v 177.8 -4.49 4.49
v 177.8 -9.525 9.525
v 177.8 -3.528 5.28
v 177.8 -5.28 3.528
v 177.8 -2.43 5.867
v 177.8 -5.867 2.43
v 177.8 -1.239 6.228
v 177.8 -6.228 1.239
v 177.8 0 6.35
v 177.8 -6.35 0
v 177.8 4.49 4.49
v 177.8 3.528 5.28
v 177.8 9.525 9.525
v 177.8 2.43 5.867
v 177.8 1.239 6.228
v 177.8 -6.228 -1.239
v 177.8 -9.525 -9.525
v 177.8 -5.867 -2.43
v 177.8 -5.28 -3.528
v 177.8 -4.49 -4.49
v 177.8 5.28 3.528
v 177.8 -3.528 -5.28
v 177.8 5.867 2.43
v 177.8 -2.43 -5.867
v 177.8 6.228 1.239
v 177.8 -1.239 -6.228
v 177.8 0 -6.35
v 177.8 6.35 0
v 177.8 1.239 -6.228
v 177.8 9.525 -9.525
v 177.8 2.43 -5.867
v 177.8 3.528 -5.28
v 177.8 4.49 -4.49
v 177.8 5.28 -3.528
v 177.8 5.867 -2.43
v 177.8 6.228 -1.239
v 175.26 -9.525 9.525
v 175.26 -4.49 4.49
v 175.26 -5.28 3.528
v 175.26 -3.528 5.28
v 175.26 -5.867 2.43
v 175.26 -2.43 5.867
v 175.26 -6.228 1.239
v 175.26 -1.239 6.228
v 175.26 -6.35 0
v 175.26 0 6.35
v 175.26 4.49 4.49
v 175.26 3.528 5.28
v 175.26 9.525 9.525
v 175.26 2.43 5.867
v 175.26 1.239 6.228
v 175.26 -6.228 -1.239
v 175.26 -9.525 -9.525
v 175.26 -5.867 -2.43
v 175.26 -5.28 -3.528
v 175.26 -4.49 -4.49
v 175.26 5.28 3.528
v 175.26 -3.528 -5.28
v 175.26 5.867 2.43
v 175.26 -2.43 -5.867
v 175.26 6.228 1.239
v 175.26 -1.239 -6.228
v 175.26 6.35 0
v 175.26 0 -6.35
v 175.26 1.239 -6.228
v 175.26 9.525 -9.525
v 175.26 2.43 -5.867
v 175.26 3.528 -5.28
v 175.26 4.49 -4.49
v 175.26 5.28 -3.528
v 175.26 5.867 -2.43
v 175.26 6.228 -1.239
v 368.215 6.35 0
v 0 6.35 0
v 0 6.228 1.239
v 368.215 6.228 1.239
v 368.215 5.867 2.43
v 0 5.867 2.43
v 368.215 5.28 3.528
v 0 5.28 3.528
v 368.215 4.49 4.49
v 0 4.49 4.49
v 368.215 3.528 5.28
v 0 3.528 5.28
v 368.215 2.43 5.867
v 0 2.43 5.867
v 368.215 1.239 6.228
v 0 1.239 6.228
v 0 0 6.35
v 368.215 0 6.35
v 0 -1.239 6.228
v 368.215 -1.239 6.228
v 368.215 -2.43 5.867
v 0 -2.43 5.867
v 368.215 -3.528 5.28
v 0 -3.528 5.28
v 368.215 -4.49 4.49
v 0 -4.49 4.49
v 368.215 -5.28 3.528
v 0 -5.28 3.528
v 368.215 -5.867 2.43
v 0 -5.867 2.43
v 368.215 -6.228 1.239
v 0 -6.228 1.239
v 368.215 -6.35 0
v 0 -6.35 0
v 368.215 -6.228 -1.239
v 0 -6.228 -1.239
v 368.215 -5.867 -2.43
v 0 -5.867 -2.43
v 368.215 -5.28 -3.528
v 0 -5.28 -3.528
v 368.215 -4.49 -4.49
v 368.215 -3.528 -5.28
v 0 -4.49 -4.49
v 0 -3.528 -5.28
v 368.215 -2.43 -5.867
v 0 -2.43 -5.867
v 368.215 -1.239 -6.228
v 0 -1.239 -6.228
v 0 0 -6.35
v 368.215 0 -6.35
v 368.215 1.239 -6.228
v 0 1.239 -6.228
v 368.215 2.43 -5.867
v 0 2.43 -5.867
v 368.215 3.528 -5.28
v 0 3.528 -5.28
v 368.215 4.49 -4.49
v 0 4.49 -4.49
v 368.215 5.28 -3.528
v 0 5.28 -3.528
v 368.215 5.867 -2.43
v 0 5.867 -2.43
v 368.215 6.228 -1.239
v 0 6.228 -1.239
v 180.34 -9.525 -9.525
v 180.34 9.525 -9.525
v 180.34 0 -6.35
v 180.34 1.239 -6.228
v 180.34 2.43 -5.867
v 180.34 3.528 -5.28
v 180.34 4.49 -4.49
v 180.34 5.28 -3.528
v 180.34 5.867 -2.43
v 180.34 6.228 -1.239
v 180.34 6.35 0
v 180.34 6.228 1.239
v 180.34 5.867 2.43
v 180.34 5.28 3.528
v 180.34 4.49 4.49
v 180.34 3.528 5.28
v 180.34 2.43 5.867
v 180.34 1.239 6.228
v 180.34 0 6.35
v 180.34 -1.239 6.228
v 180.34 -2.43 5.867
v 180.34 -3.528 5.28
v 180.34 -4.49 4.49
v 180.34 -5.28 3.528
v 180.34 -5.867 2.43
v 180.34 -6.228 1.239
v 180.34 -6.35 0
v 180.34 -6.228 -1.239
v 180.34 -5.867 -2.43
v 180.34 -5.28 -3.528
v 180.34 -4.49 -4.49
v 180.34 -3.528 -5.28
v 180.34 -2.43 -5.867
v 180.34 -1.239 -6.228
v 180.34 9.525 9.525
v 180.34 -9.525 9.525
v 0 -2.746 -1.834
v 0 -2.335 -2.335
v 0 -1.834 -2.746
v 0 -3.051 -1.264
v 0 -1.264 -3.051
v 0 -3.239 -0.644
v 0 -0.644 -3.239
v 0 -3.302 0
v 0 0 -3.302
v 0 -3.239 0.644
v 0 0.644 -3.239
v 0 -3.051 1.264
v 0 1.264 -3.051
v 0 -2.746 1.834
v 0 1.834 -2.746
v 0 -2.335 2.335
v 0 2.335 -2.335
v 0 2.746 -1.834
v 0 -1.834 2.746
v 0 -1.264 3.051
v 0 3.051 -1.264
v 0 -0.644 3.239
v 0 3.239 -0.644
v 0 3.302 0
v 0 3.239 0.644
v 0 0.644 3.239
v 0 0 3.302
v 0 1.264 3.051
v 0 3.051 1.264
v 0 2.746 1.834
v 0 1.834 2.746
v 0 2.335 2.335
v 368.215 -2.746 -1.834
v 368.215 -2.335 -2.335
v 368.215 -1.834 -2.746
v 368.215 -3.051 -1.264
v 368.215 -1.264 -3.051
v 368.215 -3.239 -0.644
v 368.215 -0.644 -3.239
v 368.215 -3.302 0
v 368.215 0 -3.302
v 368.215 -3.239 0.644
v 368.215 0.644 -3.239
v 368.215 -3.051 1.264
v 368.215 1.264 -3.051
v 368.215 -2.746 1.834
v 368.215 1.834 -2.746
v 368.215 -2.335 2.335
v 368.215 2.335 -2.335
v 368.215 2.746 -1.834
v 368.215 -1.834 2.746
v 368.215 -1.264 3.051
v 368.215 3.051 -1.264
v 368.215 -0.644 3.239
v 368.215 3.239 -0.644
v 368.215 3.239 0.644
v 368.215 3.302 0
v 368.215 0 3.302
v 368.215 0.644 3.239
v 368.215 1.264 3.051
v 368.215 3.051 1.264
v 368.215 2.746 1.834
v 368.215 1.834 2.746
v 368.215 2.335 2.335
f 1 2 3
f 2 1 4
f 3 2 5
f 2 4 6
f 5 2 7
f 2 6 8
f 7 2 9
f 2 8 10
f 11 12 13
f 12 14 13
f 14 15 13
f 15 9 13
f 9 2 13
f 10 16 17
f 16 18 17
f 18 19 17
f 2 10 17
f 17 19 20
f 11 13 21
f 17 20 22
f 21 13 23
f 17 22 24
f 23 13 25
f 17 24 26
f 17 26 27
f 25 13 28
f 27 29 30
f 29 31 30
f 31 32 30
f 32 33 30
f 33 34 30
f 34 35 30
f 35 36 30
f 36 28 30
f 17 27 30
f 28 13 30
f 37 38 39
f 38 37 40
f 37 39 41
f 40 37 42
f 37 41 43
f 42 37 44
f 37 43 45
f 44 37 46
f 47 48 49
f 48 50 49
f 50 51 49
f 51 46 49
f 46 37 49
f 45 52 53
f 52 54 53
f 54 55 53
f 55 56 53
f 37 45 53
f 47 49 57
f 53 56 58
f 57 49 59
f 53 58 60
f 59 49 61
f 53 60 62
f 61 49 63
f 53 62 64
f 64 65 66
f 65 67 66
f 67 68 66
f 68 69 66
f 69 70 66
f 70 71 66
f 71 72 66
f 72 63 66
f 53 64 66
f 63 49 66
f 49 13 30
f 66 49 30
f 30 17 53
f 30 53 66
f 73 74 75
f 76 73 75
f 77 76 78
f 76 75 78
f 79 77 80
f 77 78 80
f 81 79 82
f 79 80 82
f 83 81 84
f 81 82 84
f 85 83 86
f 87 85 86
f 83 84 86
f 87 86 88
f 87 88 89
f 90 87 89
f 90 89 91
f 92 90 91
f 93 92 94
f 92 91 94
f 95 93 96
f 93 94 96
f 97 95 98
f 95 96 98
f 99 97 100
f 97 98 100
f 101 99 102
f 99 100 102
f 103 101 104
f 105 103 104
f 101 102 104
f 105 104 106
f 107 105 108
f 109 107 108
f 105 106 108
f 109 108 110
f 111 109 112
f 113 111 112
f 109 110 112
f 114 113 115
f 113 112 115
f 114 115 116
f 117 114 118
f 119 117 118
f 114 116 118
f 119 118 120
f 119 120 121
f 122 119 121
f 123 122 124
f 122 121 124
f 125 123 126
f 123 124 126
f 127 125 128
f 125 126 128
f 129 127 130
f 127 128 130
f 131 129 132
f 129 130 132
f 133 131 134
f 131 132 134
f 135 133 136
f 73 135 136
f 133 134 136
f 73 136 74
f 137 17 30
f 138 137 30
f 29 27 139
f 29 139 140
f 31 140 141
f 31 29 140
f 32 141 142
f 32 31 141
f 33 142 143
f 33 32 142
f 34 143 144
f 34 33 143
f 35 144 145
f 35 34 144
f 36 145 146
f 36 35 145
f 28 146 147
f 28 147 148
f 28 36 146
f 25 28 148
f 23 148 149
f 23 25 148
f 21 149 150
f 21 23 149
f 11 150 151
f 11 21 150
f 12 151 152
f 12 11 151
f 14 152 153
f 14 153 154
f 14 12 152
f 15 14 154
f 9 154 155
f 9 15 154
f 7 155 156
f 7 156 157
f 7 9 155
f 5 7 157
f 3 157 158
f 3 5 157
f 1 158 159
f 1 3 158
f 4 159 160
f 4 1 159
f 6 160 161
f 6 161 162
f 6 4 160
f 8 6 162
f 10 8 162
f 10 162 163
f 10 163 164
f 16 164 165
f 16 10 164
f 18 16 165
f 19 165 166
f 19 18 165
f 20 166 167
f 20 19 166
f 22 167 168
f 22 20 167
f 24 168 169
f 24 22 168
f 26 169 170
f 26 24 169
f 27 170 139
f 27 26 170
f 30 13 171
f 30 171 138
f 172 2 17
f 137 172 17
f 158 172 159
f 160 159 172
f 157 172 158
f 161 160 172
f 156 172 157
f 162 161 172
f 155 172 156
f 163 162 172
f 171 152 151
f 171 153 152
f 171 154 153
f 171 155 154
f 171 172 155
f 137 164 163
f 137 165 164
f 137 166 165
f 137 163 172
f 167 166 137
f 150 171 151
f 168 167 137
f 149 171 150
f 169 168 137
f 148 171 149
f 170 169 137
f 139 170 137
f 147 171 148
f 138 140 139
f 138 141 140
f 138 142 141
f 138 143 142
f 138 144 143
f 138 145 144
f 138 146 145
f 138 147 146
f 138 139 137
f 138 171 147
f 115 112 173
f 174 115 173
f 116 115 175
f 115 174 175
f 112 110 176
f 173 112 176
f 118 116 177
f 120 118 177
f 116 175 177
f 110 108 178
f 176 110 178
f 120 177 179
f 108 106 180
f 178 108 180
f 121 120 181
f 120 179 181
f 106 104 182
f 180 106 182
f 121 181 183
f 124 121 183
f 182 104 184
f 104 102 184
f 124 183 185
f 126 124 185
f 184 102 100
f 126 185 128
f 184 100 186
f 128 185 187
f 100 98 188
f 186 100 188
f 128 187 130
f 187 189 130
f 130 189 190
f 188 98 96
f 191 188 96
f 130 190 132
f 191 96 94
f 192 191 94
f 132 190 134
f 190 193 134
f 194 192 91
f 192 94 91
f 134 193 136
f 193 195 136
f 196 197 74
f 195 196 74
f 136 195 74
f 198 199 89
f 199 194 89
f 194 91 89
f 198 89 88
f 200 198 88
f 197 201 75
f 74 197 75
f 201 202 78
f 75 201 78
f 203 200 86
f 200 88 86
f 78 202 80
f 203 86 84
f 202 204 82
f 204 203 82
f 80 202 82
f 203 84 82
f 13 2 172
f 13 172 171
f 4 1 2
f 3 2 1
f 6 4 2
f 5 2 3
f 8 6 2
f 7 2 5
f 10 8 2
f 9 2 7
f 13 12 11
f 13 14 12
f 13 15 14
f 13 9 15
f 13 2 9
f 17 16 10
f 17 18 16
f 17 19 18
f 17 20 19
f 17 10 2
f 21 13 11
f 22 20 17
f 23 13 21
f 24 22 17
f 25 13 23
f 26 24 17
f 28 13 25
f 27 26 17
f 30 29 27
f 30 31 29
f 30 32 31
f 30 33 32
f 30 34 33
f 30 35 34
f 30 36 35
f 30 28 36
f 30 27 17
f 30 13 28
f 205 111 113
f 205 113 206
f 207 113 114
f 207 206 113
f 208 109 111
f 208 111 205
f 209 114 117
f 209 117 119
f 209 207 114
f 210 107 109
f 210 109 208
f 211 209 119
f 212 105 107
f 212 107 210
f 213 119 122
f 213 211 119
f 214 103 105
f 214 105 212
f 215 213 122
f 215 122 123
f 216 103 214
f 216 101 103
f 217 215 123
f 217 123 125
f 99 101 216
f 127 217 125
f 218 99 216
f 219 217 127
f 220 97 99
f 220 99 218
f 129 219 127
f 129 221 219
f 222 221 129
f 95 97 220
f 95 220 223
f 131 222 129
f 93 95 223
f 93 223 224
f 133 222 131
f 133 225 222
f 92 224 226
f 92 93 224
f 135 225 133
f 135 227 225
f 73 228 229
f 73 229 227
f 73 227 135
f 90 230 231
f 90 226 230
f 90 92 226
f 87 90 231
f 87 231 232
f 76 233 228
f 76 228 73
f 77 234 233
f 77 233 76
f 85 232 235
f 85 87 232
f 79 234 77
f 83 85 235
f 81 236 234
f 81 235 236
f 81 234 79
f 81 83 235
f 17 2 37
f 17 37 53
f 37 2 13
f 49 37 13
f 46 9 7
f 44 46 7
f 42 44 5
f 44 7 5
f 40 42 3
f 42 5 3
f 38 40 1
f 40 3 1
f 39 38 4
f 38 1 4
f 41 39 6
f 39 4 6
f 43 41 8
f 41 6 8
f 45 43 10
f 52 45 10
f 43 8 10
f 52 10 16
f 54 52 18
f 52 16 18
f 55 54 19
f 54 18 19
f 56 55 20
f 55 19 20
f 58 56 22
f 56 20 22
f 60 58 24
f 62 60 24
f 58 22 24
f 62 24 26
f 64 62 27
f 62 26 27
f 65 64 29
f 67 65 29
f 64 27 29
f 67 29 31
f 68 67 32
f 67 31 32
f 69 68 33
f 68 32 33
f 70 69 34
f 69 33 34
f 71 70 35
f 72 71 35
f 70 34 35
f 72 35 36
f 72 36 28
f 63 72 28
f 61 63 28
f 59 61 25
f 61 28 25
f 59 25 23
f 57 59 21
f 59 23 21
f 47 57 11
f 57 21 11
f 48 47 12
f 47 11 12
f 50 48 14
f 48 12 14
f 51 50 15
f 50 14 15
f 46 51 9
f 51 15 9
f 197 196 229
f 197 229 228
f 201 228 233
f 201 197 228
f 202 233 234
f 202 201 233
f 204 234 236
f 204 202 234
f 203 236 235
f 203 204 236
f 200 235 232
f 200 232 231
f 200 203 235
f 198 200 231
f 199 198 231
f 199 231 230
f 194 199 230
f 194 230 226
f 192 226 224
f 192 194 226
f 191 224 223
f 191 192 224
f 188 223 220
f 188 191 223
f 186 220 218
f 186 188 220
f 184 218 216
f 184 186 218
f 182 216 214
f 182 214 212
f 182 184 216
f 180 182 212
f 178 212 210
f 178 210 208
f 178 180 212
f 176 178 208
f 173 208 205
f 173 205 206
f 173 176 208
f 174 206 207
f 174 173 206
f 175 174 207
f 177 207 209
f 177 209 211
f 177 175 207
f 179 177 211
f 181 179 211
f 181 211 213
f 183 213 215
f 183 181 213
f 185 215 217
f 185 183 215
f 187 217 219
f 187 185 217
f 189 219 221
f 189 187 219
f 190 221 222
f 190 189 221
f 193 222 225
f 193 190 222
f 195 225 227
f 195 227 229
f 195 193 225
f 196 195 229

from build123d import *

# Parameters (mm, degrees)
SKETCH11_R            = 6.35
SKETCH11_R_2          = 3.302
PULL_ROD_MEMBER_DEPTH = 368.21482491
PULL_START            = 177.8
SKETCH12_W            = 19.05
SKETCH12_H            = 19.05
SKETCH12_R            = 6.35
PULL_ROD_NUT_1_DEPTH  = 2.54
SKETCH13_W            = 19.05
SKETCH13_H            = 19.05
SKETCH13_R            = 6.35
PULL_ROD_NUT_2_DEPTH  = 2.54


with BuildPart() as part:
    # Sketch11 → Pull Rod Member (new body)
    with BuildSketch(Plane.YZ):
        Circle(SKETCH11_R)
        Circle(SKETCH11_R_2, mode=Mode.SUBTRACT)
    extrude(amount=PULL_ROD_MEMBER_DEPTH)


with BuildPart() as body_2:
    # Sketch12 → Pull Rod Nut 1 (new body)
    with BuildSketch(Plane(origin=(0, 0, 0), x_dir=(0, 0, -1), z_dir=(1, 0, 0)).offset(PULL_START)):
        Rectangle(SKETCH12_W, SKETCH12_H)
        Circle(SKETCH12_R, mode=Mode.SUBTRACT)
    extrude(amount=PULL_ROD_NUT_1_DEPTH)


with BuildPart() as body_3:
    # Sketch13 → Pull Rod Nut 2 (new body)
    with BuildSketch(Plane(origin=(0, 0, 0), x_dir=(0, 0, -1), z_dir=(1, 0, 0)).offset(PULL_START)):
        Rectangle(SKETCH13_W, SKETCH13_H)
        with Locations(Location((0, 0, 0), (0, 0, 180))):
            Circle(SKETCH13_R, mode=Mode.SUBTRACT)
    extrude(amount=-PULL_ROD_NUT_2_DEPTH)


solid = Compound([part.part, body_2.part, body_3.part])
